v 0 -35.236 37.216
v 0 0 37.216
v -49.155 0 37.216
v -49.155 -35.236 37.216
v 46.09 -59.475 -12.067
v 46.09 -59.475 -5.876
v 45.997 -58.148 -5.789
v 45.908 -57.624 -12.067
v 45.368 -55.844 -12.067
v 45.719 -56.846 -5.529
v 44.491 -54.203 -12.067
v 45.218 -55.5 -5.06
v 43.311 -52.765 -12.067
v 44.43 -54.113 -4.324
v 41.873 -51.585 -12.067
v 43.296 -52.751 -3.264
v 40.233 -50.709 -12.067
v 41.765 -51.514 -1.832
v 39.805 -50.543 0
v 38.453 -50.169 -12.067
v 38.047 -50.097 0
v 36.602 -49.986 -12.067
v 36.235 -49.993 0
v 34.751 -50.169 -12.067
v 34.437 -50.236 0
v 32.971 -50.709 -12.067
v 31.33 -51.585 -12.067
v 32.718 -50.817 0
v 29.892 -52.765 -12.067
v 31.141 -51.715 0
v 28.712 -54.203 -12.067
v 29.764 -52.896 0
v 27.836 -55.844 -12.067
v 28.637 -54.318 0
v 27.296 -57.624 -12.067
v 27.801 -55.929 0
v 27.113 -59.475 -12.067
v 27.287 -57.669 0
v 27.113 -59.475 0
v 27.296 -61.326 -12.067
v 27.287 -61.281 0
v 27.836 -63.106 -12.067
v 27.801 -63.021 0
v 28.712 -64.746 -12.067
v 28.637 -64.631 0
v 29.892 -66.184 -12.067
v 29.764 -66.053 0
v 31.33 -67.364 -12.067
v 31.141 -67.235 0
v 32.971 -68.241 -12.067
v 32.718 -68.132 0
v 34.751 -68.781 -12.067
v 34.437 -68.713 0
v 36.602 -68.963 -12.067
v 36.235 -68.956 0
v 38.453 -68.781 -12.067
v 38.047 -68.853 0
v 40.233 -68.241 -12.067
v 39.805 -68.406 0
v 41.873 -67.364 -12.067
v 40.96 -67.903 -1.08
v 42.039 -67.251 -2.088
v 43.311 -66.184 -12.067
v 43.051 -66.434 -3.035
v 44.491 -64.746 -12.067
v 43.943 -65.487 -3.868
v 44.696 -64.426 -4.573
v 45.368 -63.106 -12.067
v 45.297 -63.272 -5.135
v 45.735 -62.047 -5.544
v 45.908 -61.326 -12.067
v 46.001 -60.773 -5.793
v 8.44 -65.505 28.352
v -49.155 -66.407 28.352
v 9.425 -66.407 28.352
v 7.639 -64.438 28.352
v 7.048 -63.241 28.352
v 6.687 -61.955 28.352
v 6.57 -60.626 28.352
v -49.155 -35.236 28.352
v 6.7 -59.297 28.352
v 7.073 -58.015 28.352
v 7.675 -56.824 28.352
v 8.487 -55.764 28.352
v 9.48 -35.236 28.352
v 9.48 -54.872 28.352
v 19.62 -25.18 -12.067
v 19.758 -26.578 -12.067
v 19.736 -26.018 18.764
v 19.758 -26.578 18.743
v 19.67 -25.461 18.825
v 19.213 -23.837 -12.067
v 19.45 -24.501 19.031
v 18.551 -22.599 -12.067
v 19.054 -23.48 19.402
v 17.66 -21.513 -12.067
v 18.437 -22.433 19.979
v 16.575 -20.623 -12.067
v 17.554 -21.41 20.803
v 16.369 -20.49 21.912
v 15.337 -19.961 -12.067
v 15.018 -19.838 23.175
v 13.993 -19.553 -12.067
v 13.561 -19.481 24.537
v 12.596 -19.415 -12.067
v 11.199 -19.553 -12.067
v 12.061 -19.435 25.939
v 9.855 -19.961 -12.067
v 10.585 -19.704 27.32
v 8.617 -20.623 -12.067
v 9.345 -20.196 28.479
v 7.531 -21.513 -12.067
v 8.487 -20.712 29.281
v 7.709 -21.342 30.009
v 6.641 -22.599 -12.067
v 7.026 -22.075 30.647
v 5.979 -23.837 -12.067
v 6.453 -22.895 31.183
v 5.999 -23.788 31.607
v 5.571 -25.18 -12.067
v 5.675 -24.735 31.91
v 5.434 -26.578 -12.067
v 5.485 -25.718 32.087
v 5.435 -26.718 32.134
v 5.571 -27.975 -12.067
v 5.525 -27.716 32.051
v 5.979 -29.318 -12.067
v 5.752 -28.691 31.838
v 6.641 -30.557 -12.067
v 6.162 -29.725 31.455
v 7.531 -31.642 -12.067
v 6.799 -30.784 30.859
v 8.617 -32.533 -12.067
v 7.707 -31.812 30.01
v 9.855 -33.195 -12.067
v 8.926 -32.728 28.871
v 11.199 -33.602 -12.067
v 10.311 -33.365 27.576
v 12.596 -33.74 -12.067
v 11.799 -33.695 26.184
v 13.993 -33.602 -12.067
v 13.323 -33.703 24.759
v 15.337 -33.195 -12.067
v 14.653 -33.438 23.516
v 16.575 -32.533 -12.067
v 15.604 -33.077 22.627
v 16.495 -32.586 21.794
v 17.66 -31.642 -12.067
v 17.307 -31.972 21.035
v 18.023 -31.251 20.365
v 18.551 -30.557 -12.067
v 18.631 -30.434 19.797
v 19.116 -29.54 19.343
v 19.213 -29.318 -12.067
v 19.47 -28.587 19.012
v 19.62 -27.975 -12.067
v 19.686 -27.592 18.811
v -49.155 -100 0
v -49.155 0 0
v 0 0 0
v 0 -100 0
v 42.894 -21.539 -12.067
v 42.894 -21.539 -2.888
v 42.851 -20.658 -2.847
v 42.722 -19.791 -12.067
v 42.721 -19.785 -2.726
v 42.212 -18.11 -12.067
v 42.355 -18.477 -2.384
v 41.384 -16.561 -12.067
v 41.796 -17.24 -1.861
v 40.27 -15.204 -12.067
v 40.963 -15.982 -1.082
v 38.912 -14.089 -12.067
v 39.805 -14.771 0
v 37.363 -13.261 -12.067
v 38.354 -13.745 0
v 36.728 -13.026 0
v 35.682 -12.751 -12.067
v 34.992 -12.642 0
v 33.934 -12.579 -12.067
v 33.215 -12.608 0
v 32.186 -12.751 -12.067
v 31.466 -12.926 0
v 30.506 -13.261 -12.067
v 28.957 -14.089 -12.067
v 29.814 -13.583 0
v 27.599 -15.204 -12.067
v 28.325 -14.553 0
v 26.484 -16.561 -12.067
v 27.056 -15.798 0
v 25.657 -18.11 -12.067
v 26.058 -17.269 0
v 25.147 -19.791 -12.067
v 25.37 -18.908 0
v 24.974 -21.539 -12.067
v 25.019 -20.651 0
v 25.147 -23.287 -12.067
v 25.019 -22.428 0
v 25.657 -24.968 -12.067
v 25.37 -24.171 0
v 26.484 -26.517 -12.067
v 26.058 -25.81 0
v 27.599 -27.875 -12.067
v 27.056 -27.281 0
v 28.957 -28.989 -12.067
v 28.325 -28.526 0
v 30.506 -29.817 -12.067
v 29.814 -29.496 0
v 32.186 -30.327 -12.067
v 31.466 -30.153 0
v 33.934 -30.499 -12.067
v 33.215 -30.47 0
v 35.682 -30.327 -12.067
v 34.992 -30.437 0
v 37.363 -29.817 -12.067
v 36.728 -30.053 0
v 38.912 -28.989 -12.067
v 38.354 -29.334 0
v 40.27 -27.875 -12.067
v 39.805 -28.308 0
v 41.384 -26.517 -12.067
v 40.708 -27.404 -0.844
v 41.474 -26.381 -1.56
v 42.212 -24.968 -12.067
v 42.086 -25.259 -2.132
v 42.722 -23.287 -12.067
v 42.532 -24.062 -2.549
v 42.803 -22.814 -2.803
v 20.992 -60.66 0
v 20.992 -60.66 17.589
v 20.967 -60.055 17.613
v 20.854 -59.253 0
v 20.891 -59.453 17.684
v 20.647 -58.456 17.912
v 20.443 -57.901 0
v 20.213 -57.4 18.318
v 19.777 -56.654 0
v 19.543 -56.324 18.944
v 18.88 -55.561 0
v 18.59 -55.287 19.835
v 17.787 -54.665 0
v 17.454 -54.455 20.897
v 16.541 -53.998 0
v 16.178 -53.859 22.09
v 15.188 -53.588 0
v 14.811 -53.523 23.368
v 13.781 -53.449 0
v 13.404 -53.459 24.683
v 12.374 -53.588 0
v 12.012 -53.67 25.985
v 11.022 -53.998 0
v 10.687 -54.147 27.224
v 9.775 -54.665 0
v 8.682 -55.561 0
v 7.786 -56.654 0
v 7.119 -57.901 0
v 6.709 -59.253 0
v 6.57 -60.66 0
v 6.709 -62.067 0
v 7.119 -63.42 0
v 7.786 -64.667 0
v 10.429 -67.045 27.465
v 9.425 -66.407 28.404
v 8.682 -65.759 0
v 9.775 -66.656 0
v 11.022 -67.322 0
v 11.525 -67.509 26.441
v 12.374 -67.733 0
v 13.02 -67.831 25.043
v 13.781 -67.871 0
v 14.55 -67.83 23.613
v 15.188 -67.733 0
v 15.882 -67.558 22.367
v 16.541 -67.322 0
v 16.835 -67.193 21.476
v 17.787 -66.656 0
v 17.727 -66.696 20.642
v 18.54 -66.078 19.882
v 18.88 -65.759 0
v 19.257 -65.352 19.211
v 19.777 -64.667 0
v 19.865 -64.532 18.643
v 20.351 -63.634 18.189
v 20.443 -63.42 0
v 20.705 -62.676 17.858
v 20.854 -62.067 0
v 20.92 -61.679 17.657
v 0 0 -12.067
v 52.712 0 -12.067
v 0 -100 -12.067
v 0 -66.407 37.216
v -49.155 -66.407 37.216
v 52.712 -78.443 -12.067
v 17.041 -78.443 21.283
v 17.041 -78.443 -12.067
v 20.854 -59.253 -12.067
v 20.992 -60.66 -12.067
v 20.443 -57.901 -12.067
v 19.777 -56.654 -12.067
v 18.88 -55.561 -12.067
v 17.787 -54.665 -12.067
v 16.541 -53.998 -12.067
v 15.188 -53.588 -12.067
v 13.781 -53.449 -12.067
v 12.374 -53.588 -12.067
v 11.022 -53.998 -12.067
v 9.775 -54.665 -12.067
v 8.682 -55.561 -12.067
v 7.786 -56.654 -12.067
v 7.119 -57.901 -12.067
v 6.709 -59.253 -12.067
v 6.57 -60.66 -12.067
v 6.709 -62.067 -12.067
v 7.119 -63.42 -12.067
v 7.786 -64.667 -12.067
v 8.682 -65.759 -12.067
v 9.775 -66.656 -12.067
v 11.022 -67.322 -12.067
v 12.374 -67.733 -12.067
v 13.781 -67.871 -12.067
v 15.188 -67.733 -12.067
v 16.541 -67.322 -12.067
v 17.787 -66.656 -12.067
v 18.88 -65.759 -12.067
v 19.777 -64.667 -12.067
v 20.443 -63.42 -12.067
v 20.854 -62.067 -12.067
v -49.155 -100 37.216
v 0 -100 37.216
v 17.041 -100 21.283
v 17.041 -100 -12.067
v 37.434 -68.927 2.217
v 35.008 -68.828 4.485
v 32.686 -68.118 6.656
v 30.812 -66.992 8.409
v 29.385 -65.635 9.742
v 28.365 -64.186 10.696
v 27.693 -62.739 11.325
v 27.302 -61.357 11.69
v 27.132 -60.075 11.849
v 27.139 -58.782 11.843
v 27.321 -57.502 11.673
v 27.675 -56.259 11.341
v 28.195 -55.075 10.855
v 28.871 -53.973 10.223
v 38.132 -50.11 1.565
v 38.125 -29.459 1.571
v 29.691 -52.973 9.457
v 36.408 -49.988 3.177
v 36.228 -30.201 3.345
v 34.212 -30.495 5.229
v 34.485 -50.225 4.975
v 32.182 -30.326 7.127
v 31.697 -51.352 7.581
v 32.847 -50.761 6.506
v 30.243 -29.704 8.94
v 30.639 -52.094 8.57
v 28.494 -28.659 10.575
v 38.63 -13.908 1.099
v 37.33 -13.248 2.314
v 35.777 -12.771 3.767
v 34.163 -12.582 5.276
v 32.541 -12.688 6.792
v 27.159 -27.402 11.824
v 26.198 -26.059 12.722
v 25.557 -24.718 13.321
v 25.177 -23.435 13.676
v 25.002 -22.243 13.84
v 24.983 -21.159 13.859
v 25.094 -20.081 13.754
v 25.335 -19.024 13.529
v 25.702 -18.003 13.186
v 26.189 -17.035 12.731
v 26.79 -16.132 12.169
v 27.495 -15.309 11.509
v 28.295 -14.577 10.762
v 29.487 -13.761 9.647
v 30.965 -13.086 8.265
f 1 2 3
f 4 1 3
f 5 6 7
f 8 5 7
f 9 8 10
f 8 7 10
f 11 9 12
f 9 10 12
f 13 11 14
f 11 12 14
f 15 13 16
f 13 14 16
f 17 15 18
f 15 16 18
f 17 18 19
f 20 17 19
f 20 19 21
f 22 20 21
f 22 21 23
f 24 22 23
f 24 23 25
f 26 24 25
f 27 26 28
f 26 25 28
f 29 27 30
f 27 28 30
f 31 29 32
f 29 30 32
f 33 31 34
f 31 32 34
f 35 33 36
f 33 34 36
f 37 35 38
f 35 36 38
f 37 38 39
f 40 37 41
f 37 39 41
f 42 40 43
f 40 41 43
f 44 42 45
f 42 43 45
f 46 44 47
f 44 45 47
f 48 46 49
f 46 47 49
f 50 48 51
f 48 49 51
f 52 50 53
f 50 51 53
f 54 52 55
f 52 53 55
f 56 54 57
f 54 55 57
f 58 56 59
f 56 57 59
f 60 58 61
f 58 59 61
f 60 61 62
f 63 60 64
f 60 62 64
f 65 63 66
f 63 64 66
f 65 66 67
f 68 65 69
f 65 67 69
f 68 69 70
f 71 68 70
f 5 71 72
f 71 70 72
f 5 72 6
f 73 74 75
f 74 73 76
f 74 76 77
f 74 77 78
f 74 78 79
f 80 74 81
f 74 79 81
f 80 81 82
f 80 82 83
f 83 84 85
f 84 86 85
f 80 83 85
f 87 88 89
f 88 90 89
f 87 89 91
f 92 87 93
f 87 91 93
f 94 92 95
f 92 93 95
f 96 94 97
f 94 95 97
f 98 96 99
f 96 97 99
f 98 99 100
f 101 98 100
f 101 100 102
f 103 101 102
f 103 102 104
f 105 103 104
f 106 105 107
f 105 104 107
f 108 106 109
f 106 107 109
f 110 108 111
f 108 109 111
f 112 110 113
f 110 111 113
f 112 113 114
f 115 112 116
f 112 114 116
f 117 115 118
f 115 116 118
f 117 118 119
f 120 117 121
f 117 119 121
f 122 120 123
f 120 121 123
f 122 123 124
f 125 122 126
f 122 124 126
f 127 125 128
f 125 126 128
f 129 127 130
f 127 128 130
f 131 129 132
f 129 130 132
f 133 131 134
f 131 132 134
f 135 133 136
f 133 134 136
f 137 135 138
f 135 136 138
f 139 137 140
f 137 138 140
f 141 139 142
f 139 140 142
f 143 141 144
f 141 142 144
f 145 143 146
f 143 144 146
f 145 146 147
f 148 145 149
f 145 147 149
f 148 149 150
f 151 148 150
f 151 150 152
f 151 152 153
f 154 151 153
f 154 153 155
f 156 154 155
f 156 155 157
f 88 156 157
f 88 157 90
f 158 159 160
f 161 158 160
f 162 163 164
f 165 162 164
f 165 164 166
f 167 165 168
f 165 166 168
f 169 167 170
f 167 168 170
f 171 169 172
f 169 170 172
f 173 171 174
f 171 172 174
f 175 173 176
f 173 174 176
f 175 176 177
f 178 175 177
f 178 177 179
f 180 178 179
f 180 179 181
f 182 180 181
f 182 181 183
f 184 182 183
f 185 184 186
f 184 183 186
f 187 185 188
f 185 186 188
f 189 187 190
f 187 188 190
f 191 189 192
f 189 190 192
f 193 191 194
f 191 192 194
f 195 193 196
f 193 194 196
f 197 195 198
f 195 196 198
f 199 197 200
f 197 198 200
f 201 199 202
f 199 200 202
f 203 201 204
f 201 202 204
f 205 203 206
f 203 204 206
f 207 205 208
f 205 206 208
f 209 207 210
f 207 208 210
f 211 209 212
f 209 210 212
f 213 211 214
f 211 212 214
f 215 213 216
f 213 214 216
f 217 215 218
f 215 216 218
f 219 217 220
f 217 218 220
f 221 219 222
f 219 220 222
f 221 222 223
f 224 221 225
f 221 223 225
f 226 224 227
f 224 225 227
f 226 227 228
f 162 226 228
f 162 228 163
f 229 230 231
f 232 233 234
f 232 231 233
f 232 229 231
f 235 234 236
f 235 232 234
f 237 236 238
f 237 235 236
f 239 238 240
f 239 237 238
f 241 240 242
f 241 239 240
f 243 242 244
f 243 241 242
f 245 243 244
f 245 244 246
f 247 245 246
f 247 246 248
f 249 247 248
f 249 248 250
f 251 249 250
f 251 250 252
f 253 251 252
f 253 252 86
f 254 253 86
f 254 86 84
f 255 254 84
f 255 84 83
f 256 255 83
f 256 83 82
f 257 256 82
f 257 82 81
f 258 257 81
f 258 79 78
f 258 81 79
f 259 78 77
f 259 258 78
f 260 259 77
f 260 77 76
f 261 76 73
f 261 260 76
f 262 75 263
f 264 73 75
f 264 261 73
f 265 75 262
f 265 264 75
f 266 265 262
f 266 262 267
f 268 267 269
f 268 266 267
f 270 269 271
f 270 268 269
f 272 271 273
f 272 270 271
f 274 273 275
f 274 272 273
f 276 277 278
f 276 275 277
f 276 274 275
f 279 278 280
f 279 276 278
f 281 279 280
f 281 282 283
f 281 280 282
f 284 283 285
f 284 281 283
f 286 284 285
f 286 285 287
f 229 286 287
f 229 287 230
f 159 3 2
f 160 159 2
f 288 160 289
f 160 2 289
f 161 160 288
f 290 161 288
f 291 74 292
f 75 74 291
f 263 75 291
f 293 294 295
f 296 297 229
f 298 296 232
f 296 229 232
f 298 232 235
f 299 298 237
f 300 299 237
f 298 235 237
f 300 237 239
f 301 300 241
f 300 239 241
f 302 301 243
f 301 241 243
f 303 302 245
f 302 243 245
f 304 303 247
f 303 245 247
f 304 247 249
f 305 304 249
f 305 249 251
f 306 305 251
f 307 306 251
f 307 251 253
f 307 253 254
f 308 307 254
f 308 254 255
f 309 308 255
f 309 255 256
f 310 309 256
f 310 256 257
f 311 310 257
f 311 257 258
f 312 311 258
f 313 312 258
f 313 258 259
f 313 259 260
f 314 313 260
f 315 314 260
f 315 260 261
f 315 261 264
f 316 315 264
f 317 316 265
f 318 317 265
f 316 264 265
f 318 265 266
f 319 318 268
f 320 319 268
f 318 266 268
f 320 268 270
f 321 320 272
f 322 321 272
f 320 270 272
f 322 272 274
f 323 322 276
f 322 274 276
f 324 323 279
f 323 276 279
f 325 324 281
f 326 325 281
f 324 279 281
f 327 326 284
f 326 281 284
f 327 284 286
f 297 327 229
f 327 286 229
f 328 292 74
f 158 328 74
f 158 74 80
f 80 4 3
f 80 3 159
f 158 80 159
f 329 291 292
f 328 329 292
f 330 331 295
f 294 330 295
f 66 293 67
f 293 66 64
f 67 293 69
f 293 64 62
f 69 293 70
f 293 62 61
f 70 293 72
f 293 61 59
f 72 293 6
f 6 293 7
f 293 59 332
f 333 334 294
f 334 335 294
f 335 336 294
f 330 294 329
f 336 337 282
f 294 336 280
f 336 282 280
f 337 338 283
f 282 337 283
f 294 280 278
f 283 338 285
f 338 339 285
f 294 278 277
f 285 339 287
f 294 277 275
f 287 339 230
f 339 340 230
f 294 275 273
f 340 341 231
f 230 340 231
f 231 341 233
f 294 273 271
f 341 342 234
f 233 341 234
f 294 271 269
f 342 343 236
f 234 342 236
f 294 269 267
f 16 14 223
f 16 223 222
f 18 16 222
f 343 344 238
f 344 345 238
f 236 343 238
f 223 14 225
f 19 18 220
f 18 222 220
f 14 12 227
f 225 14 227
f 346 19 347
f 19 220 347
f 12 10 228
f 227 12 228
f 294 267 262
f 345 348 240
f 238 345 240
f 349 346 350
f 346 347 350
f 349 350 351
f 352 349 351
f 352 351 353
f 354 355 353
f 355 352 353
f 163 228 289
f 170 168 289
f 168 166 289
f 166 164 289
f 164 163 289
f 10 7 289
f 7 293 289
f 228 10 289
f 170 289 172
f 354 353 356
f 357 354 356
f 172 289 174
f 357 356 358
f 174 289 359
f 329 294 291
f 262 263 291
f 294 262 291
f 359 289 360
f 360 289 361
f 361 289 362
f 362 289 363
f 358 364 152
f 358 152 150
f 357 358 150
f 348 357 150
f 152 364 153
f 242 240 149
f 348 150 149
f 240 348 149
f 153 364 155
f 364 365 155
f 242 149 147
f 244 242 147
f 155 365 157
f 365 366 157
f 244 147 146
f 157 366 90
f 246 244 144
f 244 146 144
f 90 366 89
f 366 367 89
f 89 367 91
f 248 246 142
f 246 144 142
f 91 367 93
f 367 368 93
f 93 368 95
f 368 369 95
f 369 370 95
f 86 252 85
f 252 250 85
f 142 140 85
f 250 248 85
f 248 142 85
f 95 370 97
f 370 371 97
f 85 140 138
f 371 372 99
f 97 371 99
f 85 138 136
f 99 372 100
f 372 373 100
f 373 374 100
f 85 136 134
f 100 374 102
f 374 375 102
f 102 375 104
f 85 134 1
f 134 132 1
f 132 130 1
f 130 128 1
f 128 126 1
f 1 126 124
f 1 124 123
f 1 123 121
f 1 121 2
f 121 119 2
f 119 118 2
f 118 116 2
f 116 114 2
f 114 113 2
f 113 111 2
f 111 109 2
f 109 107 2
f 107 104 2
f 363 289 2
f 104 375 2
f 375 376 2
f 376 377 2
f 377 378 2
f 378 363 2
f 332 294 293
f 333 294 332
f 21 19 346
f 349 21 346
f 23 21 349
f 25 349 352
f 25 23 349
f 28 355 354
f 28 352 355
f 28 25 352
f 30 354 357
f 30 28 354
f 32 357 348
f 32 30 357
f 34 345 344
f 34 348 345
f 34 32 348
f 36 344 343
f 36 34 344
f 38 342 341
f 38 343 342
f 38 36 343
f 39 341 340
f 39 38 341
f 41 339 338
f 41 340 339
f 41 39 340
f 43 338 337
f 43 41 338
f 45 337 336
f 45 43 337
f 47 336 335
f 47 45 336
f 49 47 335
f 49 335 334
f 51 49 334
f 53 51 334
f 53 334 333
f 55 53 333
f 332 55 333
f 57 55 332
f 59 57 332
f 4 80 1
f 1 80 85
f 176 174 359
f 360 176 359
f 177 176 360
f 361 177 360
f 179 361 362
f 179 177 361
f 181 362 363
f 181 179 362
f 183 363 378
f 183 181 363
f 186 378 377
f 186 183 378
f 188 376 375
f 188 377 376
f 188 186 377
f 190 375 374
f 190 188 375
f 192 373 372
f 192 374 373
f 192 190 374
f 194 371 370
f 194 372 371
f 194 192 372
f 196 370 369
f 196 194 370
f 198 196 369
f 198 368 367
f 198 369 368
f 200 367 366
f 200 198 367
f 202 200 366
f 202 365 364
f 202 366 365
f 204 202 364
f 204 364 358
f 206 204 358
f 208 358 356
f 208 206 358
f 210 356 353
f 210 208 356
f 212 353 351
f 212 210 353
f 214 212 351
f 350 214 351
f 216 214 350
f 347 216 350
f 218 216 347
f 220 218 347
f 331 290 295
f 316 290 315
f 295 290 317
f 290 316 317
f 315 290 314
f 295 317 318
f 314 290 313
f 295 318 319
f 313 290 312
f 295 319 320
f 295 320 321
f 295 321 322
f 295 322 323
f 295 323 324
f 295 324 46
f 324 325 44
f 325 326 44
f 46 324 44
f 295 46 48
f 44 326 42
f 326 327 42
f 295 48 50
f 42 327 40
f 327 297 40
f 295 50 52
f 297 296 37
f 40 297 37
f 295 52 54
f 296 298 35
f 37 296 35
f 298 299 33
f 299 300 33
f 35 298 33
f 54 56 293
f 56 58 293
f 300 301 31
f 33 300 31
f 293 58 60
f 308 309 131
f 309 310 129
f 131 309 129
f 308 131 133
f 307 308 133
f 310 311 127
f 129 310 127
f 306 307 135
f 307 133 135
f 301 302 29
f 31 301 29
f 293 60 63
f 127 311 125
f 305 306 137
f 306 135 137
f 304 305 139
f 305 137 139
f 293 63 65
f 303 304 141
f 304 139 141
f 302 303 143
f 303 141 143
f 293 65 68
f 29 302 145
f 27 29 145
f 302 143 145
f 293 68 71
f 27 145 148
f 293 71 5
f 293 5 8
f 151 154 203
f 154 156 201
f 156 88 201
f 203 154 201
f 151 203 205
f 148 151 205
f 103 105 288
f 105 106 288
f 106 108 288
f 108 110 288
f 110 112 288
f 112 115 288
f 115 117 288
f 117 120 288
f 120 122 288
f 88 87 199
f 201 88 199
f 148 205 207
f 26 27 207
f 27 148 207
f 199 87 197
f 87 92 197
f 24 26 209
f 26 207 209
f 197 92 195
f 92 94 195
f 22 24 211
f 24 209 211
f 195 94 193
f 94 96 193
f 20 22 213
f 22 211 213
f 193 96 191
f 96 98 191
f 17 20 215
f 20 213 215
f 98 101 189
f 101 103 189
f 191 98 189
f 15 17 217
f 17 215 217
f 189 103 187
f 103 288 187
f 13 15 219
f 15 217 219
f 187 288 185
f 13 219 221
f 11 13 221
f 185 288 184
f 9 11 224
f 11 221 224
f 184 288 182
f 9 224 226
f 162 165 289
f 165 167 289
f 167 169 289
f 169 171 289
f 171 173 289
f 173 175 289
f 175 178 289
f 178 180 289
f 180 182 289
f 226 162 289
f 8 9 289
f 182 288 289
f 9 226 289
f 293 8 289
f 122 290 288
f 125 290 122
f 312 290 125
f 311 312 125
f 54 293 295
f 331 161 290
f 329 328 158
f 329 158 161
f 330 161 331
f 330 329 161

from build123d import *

# Parameters (mm, degrees)
F1_DEPTH = 100
F2_W     = 38.2318552583
F2_H     = 21.9314545393
F3_DEPTH = 37.5
F4_W     = 31.1708524823
F4_H     = 11.4039704204
F5_DEPTH = 100
F6_R     = 7.2110189045
F6_R_2   = 9.4884997303
F6_R_3   = 8.9600155303
F6_R_4   = 7.162126067
F7_DEPTH = 2500


with BuildPart() as f1:
    # F0 (on Front) → F1 (new body)
    with BuildSketch(Plane.XZ):
        Polygon((-49.1552427411, 37.2157283127), (-49.1552427411, 0), (0, 0), (0, -12.0665328577), (52.7116954327, -12.0665328577), (0, 37.2157283127), align=None)
    extrude(amount=F1_DEPTH)

    # F2 (on Top) → F3 (cut, symmetric)
    with BuildSketch(Plane.XY):
        with Locations((36.1572587863, -89.4082635641)):
            Rectangle(F2_W, F2_H)
    extrude(amount=F3_DEPTH, both=True, mode=Mode.SUBTRACT)

    # F4 (on Right) → F5 (cut, symmetric)
    with BuildSketch(Plane.YZ):
        with Locations((-50.8213154972, 34.0540632606)):
            Rectangle(F4_W, F4_H)
    extrude(amount=F5_DEPTH, both=True, mode=Mode.SUBTRACT)

    # F6 (on Top) → F7 (cut, symmetric)
    with BuildSketch(Plane.XY):
        with Locations((13.7812495232, -60.6602802873)):
            Circle(F6_R)
        with Locations((36.6018153727, -59.4747960567)):
            Circle(F6_R_2)
        with Locations((33.9344777167, -21.5393137187)):
            Circle(F6_R_3)
        with Locations((12.595766224, -26.5776216984)):
            Circle(F6_R_4)
    extrude(amount=F7_DEPTH, both=True, mode=Mode.SUBTRACT)


solid = f1.part
